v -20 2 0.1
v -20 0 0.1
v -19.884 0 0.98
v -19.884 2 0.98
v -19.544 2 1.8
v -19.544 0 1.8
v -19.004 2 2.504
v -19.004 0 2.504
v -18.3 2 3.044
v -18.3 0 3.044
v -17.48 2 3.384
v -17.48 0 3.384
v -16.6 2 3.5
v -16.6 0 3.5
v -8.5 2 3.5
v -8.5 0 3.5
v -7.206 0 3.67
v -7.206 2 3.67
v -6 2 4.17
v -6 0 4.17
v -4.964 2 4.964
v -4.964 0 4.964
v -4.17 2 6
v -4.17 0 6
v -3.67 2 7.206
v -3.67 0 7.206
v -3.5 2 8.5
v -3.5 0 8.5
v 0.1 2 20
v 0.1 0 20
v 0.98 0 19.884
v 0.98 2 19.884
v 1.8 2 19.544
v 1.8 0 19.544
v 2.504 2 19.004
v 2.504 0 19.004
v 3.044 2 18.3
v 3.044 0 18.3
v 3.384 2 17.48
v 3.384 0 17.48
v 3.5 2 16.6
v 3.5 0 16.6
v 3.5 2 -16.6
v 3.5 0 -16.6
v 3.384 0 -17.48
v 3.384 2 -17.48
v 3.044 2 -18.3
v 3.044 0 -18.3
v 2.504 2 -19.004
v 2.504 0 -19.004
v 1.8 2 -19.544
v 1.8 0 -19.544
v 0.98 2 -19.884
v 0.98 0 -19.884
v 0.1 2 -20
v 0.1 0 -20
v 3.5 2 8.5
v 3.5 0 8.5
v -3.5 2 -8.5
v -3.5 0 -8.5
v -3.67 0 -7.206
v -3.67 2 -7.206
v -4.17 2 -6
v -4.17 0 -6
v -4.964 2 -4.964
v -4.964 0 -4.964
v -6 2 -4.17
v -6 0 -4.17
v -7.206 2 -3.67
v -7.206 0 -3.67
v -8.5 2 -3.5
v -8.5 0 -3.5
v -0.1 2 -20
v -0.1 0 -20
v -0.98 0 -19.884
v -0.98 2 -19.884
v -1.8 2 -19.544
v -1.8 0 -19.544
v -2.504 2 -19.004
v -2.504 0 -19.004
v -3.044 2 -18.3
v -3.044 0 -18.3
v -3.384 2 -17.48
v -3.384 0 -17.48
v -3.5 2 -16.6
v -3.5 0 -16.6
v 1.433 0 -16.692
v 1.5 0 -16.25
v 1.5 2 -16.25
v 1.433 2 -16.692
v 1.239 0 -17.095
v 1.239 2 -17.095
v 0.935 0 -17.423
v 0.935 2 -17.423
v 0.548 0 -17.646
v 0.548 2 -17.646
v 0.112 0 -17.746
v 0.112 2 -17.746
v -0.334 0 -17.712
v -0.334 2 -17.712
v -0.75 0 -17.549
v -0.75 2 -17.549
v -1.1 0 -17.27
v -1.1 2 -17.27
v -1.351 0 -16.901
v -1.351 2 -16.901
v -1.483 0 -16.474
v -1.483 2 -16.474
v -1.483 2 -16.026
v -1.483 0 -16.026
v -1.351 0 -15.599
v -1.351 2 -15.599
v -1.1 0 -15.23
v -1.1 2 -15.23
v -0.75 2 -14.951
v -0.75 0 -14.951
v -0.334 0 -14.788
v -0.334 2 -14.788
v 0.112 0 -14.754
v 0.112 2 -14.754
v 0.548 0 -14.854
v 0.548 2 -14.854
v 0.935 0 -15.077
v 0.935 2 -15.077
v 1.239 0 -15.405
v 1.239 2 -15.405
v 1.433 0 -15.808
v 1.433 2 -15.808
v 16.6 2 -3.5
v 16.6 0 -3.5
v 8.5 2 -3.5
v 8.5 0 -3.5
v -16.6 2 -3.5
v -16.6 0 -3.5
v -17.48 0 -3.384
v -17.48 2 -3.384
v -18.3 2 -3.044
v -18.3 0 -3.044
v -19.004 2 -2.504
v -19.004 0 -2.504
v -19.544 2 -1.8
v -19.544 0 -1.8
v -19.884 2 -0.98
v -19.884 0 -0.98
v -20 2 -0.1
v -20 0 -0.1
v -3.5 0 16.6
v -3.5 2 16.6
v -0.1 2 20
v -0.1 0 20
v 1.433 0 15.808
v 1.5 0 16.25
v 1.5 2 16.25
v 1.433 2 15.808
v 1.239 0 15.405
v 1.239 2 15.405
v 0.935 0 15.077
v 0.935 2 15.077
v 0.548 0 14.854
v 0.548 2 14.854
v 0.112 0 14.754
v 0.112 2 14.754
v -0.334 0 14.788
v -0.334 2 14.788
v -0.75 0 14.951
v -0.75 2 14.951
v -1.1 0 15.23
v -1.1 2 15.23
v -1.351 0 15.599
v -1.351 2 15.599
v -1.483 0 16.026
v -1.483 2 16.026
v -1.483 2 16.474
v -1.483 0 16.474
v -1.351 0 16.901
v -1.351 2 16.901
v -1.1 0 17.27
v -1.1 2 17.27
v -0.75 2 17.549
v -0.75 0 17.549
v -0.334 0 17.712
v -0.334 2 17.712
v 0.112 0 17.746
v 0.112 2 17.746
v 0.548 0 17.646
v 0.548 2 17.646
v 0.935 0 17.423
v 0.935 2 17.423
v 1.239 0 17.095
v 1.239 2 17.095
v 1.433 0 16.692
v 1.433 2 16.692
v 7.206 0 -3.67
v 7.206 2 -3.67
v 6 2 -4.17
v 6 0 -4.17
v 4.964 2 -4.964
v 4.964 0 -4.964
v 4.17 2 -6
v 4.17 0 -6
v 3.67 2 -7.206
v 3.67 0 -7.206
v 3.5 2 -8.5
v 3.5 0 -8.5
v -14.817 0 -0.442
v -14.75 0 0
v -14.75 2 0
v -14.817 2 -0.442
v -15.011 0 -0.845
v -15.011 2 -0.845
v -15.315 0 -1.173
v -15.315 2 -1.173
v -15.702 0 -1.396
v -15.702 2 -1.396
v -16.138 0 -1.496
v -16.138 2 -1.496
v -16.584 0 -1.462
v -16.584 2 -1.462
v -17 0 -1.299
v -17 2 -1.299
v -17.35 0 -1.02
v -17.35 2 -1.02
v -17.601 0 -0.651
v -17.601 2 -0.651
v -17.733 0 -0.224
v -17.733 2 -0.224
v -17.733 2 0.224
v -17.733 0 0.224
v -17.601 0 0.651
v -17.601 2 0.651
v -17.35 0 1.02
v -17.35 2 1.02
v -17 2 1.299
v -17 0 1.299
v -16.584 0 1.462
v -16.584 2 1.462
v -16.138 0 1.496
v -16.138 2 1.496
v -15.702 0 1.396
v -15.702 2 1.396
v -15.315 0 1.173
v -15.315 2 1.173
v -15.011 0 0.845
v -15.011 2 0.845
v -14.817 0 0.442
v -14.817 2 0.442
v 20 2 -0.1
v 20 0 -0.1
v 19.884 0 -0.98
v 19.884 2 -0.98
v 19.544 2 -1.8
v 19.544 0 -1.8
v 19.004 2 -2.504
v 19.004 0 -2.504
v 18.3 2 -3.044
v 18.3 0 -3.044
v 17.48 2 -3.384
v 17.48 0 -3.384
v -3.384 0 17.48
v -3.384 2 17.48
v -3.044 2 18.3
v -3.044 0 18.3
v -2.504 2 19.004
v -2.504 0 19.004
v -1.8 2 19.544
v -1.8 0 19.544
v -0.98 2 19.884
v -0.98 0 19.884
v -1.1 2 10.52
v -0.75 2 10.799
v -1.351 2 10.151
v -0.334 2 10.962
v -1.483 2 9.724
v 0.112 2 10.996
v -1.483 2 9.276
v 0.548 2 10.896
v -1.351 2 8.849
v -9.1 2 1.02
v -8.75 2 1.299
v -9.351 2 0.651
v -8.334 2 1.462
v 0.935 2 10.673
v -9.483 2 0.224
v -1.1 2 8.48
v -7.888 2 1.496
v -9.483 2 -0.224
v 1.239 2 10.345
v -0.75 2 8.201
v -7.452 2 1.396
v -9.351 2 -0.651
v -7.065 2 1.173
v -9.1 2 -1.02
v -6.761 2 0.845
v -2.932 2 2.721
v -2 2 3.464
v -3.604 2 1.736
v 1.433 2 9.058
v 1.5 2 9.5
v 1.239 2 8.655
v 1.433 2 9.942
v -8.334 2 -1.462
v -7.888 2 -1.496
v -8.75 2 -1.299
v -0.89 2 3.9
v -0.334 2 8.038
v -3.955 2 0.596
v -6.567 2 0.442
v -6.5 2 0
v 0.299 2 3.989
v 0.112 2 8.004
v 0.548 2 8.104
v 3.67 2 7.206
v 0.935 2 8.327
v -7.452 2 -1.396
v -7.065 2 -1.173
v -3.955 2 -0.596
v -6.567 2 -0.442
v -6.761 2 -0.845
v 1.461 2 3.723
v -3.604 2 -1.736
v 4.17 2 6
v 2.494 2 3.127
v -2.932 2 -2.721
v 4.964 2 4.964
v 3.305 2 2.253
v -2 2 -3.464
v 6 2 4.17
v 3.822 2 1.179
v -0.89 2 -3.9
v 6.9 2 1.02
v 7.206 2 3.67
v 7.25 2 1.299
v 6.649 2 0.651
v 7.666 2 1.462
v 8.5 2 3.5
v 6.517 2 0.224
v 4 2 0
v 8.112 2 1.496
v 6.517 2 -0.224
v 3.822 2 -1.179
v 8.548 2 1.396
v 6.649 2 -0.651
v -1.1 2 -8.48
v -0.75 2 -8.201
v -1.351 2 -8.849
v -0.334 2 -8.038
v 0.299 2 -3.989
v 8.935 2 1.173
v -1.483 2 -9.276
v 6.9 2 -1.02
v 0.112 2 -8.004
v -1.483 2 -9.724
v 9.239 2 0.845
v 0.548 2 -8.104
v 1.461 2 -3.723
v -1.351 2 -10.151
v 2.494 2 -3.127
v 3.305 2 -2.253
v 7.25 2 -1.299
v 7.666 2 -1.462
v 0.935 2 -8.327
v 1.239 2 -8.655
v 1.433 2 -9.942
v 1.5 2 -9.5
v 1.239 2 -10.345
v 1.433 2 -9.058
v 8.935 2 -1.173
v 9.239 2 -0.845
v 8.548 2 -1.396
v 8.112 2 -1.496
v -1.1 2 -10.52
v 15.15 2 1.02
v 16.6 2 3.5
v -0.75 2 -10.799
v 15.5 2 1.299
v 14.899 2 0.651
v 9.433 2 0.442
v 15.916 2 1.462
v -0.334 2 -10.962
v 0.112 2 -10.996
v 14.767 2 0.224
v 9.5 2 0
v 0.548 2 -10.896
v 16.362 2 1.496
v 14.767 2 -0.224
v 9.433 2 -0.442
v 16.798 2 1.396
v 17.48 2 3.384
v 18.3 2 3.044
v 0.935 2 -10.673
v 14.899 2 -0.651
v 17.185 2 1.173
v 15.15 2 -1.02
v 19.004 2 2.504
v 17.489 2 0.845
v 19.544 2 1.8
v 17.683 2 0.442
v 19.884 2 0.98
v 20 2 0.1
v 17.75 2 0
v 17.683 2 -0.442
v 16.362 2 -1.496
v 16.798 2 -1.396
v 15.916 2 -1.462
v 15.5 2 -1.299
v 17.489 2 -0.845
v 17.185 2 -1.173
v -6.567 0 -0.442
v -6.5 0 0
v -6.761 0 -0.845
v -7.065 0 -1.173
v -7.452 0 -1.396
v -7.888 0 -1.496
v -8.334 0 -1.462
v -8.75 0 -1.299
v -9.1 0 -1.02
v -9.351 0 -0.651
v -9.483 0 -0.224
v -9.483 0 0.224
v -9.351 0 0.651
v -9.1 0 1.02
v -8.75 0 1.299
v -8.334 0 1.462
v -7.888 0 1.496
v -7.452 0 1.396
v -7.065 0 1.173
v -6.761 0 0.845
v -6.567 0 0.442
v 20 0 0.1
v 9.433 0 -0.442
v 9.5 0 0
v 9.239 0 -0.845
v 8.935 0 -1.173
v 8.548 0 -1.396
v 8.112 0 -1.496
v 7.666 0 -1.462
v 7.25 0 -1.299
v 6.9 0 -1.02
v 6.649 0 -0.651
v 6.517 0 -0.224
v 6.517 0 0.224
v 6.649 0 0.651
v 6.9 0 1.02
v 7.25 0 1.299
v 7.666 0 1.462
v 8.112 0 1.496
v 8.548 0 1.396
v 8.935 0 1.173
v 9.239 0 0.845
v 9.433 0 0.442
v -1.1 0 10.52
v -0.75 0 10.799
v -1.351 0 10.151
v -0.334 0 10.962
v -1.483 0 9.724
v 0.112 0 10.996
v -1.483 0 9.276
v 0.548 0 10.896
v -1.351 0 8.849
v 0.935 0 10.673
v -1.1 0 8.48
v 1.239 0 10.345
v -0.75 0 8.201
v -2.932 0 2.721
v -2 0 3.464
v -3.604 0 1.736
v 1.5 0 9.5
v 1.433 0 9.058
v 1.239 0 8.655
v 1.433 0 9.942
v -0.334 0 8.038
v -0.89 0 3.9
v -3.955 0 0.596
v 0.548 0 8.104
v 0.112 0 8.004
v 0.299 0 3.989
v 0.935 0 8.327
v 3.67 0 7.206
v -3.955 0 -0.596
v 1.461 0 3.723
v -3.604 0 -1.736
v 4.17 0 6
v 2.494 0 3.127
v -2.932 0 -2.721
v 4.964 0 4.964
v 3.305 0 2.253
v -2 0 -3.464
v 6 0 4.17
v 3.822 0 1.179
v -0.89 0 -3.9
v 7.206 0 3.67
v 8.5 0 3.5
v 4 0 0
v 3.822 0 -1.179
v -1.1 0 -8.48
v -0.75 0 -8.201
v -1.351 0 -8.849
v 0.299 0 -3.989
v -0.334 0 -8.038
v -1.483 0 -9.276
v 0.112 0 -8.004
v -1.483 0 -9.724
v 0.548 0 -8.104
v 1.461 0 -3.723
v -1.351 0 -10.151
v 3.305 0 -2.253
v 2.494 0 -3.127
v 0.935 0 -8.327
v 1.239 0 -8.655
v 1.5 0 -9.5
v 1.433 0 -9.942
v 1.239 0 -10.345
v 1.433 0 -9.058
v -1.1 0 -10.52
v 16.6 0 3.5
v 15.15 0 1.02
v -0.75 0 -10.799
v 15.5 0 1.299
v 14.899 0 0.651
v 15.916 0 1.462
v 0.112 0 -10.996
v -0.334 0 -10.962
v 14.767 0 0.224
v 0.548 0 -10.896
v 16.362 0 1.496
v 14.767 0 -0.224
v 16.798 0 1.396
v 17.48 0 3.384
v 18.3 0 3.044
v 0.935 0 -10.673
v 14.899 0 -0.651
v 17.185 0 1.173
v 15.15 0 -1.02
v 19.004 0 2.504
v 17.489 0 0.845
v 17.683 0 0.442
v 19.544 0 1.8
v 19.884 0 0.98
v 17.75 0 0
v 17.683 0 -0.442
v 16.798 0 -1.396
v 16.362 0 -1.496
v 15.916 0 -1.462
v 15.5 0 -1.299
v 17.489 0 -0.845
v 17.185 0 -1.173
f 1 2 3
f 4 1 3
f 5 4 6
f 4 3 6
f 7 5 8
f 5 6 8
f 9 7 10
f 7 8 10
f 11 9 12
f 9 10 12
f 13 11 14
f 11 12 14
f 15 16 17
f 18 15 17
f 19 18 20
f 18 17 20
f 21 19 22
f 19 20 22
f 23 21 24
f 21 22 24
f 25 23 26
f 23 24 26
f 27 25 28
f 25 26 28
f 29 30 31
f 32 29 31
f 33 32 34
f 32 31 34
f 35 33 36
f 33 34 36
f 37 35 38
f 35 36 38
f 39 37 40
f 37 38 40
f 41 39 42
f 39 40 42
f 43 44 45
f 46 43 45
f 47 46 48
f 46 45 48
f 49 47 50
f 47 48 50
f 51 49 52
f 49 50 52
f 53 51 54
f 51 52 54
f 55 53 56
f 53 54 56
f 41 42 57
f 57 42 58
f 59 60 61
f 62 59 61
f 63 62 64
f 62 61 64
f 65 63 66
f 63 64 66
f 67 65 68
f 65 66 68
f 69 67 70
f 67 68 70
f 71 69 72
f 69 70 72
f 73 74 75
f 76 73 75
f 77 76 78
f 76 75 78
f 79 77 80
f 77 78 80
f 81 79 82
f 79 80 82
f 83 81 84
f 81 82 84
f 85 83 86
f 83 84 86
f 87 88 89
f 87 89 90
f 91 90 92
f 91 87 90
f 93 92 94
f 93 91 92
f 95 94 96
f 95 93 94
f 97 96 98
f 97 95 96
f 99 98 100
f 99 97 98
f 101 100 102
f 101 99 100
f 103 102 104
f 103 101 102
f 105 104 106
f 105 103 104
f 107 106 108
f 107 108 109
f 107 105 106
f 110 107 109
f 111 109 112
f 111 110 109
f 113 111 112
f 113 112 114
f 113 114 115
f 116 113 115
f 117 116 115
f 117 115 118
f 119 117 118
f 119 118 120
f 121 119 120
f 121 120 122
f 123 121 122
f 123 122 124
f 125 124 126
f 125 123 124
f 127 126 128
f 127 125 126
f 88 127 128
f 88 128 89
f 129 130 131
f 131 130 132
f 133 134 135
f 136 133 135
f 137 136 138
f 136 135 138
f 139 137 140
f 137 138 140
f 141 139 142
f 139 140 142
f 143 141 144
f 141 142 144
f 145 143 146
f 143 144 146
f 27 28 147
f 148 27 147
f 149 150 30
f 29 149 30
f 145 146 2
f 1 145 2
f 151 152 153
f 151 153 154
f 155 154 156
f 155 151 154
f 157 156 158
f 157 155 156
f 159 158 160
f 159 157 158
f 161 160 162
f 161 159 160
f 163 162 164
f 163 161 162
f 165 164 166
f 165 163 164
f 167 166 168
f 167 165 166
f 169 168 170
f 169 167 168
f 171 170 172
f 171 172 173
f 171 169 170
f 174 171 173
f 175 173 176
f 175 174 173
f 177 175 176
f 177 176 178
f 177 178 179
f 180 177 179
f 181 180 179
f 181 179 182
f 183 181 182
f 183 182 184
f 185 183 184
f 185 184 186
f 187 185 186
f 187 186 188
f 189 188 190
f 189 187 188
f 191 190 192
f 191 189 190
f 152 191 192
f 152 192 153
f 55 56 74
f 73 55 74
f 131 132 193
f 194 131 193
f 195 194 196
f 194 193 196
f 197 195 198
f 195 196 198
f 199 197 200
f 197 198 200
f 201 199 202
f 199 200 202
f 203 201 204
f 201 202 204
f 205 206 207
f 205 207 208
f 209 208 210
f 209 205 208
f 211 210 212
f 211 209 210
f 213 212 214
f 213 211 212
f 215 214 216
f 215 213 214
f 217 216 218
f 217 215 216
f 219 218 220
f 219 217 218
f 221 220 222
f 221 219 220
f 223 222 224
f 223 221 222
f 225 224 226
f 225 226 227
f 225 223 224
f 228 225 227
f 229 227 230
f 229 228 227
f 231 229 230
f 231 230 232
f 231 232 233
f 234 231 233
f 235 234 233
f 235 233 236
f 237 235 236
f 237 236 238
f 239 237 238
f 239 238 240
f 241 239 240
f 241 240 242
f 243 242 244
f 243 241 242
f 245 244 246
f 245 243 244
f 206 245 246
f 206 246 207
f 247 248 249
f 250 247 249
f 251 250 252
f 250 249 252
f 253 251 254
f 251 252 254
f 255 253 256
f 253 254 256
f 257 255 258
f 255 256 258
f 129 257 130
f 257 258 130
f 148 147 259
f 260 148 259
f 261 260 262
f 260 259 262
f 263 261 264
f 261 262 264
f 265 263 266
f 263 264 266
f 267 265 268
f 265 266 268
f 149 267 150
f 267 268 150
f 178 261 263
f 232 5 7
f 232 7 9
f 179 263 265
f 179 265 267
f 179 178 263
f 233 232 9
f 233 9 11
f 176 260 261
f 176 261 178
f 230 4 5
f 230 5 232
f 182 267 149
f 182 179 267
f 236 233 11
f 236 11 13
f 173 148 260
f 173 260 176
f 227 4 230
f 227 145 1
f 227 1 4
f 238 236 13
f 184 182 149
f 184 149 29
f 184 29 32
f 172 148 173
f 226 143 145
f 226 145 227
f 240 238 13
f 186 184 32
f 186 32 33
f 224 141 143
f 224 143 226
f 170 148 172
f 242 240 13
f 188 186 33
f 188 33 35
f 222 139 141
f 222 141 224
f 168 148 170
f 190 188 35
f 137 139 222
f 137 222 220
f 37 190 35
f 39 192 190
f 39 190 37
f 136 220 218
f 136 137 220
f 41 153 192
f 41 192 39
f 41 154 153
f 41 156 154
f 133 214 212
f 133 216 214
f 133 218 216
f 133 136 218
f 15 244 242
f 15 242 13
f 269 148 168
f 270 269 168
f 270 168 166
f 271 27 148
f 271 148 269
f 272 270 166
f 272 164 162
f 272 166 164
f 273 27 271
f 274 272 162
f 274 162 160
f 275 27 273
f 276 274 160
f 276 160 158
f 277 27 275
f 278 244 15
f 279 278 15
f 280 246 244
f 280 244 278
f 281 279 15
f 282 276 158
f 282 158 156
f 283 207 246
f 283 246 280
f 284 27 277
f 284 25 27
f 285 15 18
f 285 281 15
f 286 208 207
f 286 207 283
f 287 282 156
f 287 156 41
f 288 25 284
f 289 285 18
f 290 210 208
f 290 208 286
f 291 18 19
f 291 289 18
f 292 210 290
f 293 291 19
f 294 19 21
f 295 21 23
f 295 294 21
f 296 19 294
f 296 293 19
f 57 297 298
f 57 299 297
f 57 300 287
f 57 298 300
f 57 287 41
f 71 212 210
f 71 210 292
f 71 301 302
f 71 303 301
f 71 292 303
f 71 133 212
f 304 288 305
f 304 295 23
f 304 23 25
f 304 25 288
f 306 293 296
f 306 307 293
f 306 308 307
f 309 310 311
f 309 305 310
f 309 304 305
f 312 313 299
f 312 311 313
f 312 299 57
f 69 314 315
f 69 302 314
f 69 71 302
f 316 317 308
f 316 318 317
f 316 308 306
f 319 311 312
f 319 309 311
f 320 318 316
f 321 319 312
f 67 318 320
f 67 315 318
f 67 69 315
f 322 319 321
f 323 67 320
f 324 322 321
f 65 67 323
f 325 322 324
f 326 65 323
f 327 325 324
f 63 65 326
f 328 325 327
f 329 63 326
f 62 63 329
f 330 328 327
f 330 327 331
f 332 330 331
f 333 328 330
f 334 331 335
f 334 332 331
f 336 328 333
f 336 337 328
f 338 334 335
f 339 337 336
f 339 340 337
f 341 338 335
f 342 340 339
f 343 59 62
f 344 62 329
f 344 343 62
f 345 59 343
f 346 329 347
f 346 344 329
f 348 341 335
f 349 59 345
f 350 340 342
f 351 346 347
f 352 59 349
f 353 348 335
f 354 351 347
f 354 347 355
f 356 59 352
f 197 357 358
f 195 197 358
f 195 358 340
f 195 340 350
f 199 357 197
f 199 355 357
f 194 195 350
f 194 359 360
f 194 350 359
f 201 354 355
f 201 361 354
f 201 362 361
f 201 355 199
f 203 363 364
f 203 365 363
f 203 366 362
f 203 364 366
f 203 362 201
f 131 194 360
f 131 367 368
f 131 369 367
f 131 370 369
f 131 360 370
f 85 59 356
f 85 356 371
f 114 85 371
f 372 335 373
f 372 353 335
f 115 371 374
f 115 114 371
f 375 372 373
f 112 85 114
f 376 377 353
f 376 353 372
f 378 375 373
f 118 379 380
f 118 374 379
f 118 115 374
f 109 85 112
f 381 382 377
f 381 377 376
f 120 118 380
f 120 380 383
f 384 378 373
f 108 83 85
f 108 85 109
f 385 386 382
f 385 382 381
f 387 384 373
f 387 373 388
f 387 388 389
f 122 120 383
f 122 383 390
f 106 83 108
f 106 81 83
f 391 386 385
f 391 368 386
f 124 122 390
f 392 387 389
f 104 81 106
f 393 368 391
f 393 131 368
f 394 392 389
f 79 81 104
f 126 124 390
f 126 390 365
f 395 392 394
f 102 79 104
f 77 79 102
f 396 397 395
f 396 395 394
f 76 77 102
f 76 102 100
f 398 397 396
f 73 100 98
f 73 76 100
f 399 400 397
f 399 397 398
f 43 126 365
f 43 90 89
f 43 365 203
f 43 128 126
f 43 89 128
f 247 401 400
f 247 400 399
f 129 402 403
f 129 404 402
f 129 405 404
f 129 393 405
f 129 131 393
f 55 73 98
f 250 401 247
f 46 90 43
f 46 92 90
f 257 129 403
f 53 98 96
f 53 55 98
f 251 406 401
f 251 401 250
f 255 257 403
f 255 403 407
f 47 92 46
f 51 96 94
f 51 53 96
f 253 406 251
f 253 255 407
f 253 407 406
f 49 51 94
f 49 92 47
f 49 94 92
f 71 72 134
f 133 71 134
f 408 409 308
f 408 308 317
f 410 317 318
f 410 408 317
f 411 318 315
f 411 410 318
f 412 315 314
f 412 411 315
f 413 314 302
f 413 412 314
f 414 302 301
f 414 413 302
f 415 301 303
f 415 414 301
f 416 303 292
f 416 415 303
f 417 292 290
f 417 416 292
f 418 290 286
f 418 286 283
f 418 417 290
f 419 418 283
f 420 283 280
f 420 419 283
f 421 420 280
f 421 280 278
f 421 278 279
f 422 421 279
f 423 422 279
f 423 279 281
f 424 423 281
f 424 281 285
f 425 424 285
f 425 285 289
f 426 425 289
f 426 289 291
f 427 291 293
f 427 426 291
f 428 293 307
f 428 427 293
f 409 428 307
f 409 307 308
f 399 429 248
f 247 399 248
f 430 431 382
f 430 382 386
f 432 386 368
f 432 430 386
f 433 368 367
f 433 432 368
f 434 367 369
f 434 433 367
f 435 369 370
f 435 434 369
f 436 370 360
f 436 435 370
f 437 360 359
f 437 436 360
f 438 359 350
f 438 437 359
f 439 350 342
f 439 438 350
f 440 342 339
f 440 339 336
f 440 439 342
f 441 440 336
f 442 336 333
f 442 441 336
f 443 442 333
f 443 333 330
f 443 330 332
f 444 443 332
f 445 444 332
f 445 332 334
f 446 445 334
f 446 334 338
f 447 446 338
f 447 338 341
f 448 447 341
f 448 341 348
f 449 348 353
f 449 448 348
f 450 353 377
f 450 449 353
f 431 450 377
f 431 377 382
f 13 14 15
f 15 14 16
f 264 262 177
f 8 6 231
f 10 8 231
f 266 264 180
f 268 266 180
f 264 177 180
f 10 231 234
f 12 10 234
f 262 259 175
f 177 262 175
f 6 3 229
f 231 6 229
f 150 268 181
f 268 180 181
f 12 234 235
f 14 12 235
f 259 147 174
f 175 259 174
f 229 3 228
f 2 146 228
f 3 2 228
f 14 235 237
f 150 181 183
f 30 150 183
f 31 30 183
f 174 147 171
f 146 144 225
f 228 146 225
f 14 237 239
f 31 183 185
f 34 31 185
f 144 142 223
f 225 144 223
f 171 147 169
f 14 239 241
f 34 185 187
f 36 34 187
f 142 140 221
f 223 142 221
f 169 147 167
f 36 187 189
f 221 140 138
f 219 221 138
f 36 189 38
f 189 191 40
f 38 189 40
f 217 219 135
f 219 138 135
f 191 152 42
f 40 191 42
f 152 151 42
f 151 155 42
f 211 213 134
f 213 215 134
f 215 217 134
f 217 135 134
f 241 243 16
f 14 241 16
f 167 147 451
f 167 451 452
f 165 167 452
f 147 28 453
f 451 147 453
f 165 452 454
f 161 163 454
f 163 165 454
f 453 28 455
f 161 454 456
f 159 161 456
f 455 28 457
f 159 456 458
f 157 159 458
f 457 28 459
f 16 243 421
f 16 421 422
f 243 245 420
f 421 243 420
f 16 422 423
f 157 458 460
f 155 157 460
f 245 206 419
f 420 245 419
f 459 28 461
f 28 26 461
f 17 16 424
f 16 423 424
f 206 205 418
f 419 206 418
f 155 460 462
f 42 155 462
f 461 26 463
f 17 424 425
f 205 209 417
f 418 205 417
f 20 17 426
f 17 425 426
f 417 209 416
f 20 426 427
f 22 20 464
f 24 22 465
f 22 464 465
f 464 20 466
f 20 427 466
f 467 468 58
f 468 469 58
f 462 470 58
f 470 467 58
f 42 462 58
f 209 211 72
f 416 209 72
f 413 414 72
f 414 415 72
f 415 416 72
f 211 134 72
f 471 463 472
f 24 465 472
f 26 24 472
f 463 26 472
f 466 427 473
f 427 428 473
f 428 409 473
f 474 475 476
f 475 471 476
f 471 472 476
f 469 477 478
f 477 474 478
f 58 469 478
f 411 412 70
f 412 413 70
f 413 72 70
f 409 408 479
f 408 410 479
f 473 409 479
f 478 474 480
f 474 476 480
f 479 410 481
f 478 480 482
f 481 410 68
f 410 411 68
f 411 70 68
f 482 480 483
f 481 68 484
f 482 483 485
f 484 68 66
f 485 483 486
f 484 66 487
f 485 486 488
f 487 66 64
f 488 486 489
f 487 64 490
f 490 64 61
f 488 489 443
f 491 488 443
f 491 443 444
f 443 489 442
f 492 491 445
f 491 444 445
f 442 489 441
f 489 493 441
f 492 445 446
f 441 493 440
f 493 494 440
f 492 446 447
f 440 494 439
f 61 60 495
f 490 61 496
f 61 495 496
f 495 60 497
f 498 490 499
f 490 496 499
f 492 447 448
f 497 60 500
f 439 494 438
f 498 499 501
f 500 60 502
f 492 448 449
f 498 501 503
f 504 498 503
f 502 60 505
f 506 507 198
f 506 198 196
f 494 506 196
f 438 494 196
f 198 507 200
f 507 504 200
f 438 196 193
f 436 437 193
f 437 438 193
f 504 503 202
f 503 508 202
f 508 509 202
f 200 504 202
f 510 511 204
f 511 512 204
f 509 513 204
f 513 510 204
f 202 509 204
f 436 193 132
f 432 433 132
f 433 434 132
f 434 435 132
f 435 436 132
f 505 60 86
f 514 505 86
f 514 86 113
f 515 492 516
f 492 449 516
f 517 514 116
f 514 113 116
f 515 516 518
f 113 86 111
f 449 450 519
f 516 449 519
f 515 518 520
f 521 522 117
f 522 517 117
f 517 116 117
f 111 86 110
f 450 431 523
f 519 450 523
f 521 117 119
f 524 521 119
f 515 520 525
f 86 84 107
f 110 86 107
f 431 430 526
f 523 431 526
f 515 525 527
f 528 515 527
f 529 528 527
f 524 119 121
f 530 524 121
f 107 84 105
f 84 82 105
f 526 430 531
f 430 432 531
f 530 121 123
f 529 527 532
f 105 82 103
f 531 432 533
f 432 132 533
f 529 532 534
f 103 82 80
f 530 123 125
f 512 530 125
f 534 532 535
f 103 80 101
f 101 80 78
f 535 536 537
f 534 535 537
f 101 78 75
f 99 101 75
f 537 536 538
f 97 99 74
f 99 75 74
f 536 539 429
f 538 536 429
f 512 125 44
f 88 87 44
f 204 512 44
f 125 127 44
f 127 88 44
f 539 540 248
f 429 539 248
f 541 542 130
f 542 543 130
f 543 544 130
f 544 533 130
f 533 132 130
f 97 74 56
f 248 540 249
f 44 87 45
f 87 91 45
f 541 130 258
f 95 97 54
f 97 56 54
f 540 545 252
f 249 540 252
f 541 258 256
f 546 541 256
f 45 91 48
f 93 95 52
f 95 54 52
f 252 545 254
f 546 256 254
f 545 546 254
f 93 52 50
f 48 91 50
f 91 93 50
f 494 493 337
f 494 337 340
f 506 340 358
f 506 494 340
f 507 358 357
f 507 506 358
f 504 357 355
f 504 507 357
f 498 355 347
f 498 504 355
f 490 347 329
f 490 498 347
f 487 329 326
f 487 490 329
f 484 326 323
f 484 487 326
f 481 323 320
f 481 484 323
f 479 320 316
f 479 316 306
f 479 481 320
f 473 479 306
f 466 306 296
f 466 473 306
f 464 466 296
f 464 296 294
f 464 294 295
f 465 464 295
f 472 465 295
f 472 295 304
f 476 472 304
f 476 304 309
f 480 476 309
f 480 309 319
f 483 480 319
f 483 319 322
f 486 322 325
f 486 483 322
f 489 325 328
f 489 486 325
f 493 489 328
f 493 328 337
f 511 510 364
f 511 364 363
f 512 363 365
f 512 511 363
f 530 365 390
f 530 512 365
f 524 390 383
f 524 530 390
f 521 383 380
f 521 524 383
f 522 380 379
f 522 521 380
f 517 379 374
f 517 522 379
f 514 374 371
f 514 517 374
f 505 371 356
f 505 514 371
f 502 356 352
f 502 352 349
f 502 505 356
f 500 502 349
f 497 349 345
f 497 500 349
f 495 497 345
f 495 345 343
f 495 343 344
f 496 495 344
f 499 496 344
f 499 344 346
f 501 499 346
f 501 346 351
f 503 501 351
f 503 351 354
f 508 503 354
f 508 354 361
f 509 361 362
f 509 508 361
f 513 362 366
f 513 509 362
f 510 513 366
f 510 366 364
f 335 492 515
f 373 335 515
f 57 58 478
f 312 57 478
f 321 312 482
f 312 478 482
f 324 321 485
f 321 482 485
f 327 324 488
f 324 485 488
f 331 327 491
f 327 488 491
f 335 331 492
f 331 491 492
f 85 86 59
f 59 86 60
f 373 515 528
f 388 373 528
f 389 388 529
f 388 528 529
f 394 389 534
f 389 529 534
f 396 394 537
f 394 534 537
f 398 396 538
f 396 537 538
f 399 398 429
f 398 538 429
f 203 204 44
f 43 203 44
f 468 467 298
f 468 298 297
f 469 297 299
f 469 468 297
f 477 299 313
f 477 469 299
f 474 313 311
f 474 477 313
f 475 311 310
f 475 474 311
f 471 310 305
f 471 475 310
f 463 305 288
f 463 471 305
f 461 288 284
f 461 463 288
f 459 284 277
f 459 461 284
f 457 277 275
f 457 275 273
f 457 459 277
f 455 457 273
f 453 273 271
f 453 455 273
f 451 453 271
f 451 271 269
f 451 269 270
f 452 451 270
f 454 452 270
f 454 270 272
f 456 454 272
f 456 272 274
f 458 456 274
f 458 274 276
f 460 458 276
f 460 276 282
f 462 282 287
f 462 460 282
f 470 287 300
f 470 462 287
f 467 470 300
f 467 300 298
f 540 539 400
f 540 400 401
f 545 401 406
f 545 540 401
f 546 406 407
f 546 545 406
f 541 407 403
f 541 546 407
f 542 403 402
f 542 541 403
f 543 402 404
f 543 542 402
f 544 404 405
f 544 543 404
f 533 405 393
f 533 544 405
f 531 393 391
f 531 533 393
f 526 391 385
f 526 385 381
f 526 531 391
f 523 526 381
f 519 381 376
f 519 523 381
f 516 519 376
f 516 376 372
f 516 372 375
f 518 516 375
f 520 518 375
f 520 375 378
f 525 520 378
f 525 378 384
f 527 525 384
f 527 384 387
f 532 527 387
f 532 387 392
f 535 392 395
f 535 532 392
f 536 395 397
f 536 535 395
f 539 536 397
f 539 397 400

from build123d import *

# Parameters (mm, degrees)
CROQUIS1_R              = 4
CROQUIS1_R_2            = 1.5
SALIENTE_EXTRUIR1_DEPTH = 2


with BuildPart() as part:
    # Croquis1 → Saliente-Extruir1 (new body)
    with BuildSketch(Plane(origin=(0, 0, 0), x_dir=(1, 0, 0), z_dir=(0, 1, 0))):
        with BuildLine():
            Line((16.6, 3.5), (8.5, 3.5))
            ThreePointArc((8.5, 3.5), (4.964466094, 4.964466094), (3.5, 8.5))
            Line((3.5, 8.5), (3.5, 16.6))
            ThreePointArc((3.5, 16.6), (2.504163056, 19.004163056), (0.1, 20))
            Line((0.1, 20), (-0.1, 20))
            ThreePointArc((-0.1, 20), (-2.504163056, 19.004163056), (-3.5, 16.6))
            Line((-3.5, 16.6), (-3.5, 8.5))
            ThreePointArc((-3.5, 8.5), (-4.964466094, 4.964466094), (-8.5, 3.5))
            Line((-8.5, 3.5), (-16.6, 3.5))
            ThreePointArc((-16.6, 3.5), (-19.004163056, 2.504163056), (-20, 0.1))
            Line((-20, 0.1), (-20, -0.1))
            ThreePointArc((-20, -0.1), (-19.004163056, -2.504163056), (-16.6, -3.5))
            Line((-16.6, -3.5), (-8.5, -3.5))
            ThreePointArc((-8.5, -3.5), (-4.964466094, -4.964466094), (-3.5, -8.5))
            Line((-3.5, -8.5), (-3.5, -16.6))
            ThreePointArc((-3.5, -16.6), (-2.504163056, -19.004163056), (-0.1, -20))
            Line((-0.1, -20), (0.1, -20))
            ThreePointArc((0.1, -20), (2.504163056, -19.004163056), (3.5, -16.6))
            Line((3.5, -16.6), (3.5, -8.5))
            ThreePointArc((3.5, -8.5), (4.964466094, -4.964466094), (8.5, -3.5))
            Line((8.5, -3.5), (16.6, -3.5))
            ThreePointArc((16.6, -3.5), (19.004163056, -2.504163056), (20, -0.1))
            Line((20, -0.1), (20, 0.1))
            ThreePointArc((20, 0.1), (19.004163056, 2.504163056), (16.6, 3.5))
        make_face()
        Circle(CROQUIS1_R, mode=Mode.SUBTRACT)
        with Locations((0, 9.5)):
            Circle(CROQUIS1_R_2, mode=Mode.SUBTRACT)
        with Locations((0, 16.25)):
            Circle(CROQUIS1_R_2, mode=Mode.SUBTRACT)
        with Locations((0, -9.5)):
            Circle(CROQUIS1_R_2, mode=Mode.SUBTRACT)
        with Locations((0, -16.25)):
            Circle(CROQUIS1_R_2, mode=Mode.SUBTRACT)
        with Locations((8, 0)):
            Circle(CROQUIS1_R_2, mode=Mode.SUBTRACT)
        with Locations((16.25, 0)):
            Circle(CROQUIS1_R_2, mode=Mode.SUBTRACT)
        with Locations((-16.25, 0)):
            Circle(CROQUIS1_R_2, mode=Mode.SUBTRACT)
        with Locations((-8, 0)):
            Circle(CROQUIS1_R_2, mode=Mode.SUBTRACT)
    extrude(amount=SALIENTE_EXTRUIR1_DEPTH)


solid = part.part
